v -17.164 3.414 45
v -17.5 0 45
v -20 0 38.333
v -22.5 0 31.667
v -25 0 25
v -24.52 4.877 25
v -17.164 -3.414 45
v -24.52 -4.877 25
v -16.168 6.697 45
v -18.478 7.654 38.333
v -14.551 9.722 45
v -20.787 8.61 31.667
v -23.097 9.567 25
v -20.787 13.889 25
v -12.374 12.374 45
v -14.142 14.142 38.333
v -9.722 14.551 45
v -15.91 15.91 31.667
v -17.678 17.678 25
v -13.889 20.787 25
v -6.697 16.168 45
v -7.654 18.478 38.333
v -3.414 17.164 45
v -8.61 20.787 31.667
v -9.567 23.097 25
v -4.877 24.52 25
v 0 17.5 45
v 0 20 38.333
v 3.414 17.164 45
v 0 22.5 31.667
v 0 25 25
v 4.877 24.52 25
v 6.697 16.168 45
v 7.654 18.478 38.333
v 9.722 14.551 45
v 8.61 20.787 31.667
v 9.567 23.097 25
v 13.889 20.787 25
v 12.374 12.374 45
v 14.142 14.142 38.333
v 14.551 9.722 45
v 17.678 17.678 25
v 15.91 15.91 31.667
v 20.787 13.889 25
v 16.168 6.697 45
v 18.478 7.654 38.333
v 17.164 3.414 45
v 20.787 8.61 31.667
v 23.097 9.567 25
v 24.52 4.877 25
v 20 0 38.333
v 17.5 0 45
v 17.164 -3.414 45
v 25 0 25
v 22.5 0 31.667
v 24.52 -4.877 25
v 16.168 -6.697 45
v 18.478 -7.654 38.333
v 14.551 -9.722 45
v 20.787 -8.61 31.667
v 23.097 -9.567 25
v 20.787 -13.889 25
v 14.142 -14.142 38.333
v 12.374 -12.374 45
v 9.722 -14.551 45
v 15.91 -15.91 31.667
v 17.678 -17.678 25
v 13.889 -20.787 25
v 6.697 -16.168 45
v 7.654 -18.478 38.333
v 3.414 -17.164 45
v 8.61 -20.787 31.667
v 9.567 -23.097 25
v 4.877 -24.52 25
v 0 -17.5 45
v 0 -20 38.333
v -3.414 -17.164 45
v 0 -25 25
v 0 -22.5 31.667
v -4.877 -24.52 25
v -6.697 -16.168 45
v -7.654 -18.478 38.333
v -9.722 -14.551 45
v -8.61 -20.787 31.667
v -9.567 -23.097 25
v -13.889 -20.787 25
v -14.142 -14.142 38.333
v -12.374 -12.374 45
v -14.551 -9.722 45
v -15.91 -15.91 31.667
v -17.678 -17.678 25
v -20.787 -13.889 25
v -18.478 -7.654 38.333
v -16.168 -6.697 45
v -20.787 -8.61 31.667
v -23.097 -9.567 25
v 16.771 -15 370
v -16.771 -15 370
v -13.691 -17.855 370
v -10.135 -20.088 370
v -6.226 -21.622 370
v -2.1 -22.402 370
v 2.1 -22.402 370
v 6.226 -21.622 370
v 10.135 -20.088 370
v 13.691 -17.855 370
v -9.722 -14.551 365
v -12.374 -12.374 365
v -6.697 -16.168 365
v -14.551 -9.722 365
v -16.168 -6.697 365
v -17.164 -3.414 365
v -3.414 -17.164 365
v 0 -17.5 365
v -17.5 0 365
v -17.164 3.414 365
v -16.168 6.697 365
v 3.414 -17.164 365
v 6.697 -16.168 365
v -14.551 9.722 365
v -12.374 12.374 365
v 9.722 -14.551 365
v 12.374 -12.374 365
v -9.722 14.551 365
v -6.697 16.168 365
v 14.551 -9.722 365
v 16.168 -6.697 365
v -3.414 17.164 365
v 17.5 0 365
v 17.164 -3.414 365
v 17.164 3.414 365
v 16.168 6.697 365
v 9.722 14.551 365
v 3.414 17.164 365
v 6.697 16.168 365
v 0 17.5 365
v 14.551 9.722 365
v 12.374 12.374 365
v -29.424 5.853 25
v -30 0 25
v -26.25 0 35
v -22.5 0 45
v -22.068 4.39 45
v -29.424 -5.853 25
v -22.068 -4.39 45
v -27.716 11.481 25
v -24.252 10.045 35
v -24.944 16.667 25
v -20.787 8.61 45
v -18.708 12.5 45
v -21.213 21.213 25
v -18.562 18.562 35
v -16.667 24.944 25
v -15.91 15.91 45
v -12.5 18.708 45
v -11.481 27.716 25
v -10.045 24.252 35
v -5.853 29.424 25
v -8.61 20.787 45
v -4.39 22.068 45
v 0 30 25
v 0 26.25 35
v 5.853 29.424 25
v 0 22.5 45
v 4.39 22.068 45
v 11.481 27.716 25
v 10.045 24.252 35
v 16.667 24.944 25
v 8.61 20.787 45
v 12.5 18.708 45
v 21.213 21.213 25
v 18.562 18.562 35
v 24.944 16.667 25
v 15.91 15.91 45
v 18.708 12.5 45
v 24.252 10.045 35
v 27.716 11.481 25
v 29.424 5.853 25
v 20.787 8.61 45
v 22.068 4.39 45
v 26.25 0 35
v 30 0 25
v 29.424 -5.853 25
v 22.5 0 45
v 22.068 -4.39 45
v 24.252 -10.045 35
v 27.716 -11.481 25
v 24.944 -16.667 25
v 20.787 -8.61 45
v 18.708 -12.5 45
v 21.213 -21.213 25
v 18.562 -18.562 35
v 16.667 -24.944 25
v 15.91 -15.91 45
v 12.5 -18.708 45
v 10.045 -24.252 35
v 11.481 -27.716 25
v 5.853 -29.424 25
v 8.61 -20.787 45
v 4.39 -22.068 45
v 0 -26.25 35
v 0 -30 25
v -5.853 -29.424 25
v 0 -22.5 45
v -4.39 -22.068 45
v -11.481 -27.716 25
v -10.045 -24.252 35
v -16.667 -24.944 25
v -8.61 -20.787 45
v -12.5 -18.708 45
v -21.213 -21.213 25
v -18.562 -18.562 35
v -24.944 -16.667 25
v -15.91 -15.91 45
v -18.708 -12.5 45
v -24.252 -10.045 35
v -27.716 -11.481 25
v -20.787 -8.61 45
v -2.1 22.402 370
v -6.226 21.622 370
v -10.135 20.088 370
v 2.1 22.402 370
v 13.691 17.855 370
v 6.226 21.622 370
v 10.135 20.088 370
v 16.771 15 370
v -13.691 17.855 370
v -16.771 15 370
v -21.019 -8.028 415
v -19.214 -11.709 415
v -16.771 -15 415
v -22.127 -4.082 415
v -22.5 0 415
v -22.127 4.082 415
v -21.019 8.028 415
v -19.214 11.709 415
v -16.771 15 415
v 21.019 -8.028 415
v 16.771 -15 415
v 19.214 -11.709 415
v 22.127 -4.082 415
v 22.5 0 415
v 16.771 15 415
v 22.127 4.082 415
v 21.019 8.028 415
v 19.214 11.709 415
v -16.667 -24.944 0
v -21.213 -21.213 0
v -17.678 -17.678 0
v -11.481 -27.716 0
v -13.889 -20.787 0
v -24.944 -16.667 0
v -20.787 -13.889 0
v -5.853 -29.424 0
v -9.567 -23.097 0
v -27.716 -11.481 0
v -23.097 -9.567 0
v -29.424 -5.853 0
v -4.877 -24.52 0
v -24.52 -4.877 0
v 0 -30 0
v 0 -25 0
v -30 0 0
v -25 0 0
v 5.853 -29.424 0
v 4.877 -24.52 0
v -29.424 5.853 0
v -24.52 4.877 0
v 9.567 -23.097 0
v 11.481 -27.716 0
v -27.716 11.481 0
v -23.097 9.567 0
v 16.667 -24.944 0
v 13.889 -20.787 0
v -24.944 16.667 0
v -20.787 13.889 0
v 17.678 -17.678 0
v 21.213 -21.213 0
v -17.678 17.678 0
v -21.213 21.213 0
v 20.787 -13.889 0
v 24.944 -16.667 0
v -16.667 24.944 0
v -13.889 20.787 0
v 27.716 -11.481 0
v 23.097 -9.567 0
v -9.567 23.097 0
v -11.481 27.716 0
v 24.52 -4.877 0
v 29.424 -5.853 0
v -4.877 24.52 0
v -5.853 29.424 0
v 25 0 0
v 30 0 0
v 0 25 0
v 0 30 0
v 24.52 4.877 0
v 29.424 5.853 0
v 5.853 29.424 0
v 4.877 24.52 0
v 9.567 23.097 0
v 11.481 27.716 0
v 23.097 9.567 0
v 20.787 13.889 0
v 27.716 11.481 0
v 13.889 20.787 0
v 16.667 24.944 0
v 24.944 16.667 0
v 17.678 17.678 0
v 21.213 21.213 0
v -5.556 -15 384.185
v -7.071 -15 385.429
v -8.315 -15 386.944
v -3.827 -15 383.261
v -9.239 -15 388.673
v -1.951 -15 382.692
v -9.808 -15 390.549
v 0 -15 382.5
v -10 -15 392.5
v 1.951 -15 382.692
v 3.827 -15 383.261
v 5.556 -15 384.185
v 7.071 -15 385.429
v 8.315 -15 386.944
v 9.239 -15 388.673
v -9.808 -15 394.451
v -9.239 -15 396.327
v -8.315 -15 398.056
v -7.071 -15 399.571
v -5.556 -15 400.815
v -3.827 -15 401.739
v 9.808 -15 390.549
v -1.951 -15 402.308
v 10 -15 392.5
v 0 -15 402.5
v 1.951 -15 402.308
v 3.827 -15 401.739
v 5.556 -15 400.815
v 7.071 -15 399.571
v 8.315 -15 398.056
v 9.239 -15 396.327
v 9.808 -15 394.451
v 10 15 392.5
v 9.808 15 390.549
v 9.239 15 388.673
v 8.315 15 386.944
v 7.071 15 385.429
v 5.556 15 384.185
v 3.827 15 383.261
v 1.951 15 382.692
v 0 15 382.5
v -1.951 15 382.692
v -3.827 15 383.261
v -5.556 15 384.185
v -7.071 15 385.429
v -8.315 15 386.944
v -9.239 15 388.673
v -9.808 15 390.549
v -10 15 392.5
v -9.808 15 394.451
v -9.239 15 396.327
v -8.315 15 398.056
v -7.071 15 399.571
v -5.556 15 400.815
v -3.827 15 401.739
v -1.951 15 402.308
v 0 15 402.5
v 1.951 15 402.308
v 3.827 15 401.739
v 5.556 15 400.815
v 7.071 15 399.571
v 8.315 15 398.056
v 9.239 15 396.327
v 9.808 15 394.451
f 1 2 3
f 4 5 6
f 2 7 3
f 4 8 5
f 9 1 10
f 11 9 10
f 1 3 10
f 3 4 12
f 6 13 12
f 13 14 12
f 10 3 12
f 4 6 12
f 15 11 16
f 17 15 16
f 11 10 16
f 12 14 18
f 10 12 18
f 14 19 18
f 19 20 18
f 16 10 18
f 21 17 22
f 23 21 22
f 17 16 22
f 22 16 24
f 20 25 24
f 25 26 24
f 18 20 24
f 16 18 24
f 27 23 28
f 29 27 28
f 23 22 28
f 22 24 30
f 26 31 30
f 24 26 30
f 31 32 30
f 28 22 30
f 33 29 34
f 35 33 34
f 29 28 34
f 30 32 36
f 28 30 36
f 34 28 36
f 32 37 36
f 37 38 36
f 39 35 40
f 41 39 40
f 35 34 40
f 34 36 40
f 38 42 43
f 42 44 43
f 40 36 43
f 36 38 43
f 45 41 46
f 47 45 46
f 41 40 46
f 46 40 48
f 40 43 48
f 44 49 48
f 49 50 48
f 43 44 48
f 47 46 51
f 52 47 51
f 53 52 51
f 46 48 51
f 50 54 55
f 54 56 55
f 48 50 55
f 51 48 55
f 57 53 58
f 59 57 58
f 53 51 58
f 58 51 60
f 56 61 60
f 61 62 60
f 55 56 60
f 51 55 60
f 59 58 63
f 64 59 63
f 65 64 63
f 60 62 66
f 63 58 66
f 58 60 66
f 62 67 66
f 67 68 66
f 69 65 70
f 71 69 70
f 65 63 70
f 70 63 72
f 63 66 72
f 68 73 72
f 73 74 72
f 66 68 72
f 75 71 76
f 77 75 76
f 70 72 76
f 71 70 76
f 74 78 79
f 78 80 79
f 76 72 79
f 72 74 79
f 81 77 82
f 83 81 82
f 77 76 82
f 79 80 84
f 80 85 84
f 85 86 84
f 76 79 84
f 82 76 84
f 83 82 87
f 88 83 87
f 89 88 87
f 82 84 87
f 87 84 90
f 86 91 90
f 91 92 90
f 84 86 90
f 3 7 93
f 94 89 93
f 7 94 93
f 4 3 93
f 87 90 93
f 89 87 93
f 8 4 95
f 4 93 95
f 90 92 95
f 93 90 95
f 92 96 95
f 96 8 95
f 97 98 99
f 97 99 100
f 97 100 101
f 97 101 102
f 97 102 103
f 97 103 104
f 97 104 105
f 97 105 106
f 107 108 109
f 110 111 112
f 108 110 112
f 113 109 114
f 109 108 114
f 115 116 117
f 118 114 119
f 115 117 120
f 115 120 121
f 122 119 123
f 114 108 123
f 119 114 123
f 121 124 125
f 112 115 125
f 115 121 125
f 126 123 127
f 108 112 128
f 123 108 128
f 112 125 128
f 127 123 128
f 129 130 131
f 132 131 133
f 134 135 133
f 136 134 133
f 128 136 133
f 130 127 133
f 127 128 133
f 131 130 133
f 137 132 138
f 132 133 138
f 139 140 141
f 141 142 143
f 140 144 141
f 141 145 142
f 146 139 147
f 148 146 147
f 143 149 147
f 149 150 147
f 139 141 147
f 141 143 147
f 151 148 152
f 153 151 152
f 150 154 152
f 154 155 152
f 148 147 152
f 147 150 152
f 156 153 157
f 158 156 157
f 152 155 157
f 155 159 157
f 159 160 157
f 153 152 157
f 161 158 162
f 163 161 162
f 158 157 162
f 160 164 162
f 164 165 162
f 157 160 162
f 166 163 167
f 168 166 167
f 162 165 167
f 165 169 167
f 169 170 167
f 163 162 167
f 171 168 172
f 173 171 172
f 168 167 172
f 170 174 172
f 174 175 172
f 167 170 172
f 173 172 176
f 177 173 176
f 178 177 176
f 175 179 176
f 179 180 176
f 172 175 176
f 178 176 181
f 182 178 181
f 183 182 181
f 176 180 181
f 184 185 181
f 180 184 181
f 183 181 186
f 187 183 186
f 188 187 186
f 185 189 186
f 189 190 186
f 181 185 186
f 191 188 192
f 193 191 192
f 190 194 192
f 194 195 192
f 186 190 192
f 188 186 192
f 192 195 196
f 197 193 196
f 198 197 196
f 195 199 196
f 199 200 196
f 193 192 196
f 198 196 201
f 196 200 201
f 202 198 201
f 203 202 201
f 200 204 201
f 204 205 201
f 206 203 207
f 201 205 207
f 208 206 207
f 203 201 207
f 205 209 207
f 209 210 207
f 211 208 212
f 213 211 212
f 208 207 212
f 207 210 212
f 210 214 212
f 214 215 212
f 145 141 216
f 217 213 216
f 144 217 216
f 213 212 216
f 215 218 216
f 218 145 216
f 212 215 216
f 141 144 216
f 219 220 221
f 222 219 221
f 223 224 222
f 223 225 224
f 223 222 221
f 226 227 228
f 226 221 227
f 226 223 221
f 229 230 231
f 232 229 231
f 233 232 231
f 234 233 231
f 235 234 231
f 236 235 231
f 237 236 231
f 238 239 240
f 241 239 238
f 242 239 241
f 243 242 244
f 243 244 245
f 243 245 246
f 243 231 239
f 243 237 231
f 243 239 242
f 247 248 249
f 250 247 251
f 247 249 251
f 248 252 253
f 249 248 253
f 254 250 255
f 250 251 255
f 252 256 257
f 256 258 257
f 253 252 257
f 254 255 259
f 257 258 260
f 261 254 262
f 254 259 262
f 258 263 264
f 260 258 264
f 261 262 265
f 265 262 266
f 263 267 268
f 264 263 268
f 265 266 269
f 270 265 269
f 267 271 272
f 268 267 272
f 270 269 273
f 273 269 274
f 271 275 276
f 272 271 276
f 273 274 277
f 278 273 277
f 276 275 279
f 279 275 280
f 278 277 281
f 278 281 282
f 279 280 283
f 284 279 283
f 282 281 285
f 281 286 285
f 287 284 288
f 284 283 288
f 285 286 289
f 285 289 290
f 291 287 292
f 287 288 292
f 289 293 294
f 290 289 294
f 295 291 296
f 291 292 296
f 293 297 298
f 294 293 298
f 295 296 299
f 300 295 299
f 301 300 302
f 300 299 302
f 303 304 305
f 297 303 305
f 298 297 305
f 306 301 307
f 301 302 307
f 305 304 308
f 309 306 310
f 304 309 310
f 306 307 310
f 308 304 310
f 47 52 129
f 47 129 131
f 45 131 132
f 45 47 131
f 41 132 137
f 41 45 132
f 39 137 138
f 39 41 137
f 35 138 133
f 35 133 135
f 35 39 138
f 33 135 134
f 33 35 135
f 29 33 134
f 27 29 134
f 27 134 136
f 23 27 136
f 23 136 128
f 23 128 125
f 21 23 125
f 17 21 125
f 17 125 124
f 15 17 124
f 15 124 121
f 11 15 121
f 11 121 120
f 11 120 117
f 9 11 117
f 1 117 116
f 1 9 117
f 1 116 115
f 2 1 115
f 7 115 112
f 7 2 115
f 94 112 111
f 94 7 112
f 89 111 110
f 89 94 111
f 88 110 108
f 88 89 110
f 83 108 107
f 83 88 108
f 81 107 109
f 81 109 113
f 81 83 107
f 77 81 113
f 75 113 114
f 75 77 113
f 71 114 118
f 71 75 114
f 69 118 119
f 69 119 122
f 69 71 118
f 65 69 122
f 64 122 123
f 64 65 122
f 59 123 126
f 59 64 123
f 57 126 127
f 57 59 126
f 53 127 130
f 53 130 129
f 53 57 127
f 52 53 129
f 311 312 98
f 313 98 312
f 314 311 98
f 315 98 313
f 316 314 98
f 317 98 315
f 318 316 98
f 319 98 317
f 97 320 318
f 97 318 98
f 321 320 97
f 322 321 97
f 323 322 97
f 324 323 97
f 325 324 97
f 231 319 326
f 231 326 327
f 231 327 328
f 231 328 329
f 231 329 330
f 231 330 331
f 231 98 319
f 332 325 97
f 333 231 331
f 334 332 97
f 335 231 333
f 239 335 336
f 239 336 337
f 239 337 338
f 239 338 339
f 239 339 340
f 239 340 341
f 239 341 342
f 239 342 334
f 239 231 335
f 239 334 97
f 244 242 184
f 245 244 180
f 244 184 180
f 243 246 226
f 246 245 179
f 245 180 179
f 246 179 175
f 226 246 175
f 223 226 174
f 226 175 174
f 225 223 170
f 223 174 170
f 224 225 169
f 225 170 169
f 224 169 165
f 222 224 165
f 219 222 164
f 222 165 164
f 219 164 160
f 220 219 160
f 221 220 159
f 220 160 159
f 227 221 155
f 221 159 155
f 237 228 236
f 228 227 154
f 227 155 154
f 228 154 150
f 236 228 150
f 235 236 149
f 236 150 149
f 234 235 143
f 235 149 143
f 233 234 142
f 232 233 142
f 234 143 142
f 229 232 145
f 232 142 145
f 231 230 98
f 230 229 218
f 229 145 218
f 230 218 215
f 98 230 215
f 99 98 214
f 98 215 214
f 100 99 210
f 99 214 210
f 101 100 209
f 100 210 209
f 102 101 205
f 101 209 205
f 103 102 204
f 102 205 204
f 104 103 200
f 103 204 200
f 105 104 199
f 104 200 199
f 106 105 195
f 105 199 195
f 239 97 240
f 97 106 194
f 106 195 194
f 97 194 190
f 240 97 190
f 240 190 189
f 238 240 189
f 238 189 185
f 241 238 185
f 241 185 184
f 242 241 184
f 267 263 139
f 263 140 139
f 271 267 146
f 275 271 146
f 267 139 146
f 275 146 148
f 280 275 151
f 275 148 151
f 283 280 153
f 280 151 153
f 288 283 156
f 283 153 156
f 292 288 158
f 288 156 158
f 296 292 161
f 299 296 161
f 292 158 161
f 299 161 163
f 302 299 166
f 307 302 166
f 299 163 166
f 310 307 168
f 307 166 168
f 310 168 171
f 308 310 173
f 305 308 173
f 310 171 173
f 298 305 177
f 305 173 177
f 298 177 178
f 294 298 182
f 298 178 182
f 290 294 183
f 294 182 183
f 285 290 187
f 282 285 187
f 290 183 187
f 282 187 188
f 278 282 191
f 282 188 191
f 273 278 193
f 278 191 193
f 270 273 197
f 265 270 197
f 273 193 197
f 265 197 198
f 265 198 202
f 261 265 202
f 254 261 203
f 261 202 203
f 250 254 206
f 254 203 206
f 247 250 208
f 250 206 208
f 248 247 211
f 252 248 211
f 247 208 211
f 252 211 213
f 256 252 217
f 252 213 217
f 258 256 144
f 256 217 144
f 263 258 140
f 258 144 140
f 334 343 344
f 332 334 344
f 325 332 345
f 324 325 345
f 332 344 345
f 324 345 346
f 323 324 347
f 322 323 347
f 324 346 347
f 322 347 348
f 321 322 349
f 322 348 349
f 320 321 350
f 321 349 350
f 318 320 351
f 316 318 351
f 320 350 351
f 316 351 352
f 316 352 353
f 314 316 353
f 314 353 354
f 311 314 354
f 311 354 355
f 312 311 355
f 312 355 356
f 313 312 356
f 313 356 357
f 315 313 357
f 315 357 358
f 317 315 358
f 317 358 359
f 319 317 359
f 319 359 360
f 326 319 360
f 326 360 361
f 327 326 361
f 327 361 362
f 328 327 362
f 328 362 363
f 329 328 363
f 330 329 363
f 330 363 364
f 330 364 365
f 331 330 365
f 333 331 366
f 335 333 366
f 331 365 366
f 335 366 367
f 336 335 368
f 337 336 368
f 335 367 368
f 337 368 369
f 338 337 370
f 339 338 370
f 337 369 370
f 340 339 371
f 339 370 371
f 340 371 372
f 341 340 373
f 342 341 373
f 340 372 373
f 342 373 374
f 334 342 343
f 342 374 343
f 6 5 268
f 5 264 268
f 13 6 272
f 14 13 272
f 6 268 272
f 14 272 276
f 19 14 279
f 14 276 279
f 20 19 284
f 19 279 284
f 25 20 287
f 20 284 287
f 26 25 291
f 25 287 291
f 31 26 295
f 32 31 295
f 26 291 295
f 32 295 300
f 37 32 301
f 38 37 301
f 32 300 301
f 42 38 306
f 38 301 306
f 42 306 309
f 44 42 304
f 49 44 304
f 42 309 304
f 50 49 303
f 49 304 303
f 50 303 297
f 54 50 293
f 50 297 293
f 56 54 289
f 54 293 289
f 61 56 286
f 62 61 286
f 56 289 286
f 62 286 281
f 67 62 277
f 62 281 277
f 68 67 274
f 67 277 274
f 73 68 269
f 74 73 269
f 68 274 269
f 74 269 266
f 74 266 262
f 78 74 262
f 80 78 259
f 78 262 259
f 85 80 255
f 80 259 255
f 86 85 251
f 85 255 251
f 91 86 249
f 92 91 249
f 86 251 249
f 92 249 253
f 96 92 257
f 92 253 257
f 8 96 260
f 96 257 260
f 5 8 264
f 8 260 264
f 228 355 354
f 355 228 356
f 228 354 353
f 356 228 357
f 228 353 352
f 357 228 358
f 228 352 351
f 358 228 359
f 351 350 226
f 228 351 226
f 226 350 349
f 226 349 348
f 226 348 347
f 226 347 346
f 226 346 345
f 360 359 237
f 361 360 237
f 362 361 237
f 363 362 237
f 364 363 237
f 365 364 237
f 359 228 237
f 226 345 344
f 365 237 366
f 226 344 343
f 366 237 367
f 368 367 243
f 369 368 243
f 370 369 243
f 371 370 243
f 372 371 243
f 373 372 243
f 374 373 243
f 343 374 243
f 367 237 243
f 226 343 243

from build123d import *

# Parameters (mm, degrees)
SKETCH3_R               = 22.5
SKETCH3_R_2             = 17.5
BOSS_EXTRUDE1_DEPTH     = 320
SKETCH4_R               = 22.5
BOSS_EXTRUDE2_DEPTH     = 50
SKETCH5_W               = 33.541019662
SKETCH5_H               = 20
CUT_EXTRUDE1_DEPTH      = 45
SKETCH6_R               = 10
CUT_EXTRUDE3_DEPTH      = 16
CUT_EXTRUDE3_DEPTH_BACK = 46


with BuildPart() as part:
    # Sketch2 → Revolve1 (revolve)
    with BuildSketch(Plane(origin=(0, 0, 0), x_dir=(1, 0, 0), z_dir=(0, 1, 0))):
        Polygon((-30, 0), (-30, -25), (-22.5, -45), (-17.5, -45), (-25, -25), (-25, 0), align=None)
    revolve(axis=Axis((0, 0, 47.25), (0, 0, -1)))

    # Sketch3 → Boss-Extrude1 (add)
    with BuildSketch(Plane.XY.offset(45)):
        Circle(SKETCH3_R)
        Circle(SKETCH3_R_2, mode=Mode.SUBTRACT)
    extrude(amount=BOSS_EXTRUDE1_DEPTH)

    # Sketch4 → Boss-Extrude2 (add)
    with BuildSketch(Plane.XY.offset(365)):
        Circle(SKETCH4_R)
    extrude(amount=BOSS_EXTRUDE2_DEPTH)

    # Sketch5 → Cut-Extrude1 (cut)
    with BuildSketch(Plane.XY.offset(415)):
        with Locations((0, 25)):
            Rectangle(SKETCH5_W, SKETCH5_H)
        with Locations((0, -25)):
            Rectangle(SKETCH5_W, SKETCH5_H)
    extrude(amount=-CUT_EXTRUDE1_DEPTH, mode=Mode.SUBTRACT)

    # Sketch6 → Cut-Extrude3 (cut, two sides)
    with BuildSketch(Plane(origin=(0, 15, 0), x_dir=(1, 0, 0), z_dir=(0, 1, 0))) as cut_extrude3_sk:
        with Locations((0, -392.5)):
            Circle(SKETCH6_R)
    extrude(amount=CUT_EXTRUDE3_DEPTH, mode=Mode.SUBTRACT)
    extrude(cut_extrude3_sk.sketch, amount=-CUT_EXTRUDE3_DEPTH_BACK, mode=Mode.SUBTRACT)


solid = part.part
